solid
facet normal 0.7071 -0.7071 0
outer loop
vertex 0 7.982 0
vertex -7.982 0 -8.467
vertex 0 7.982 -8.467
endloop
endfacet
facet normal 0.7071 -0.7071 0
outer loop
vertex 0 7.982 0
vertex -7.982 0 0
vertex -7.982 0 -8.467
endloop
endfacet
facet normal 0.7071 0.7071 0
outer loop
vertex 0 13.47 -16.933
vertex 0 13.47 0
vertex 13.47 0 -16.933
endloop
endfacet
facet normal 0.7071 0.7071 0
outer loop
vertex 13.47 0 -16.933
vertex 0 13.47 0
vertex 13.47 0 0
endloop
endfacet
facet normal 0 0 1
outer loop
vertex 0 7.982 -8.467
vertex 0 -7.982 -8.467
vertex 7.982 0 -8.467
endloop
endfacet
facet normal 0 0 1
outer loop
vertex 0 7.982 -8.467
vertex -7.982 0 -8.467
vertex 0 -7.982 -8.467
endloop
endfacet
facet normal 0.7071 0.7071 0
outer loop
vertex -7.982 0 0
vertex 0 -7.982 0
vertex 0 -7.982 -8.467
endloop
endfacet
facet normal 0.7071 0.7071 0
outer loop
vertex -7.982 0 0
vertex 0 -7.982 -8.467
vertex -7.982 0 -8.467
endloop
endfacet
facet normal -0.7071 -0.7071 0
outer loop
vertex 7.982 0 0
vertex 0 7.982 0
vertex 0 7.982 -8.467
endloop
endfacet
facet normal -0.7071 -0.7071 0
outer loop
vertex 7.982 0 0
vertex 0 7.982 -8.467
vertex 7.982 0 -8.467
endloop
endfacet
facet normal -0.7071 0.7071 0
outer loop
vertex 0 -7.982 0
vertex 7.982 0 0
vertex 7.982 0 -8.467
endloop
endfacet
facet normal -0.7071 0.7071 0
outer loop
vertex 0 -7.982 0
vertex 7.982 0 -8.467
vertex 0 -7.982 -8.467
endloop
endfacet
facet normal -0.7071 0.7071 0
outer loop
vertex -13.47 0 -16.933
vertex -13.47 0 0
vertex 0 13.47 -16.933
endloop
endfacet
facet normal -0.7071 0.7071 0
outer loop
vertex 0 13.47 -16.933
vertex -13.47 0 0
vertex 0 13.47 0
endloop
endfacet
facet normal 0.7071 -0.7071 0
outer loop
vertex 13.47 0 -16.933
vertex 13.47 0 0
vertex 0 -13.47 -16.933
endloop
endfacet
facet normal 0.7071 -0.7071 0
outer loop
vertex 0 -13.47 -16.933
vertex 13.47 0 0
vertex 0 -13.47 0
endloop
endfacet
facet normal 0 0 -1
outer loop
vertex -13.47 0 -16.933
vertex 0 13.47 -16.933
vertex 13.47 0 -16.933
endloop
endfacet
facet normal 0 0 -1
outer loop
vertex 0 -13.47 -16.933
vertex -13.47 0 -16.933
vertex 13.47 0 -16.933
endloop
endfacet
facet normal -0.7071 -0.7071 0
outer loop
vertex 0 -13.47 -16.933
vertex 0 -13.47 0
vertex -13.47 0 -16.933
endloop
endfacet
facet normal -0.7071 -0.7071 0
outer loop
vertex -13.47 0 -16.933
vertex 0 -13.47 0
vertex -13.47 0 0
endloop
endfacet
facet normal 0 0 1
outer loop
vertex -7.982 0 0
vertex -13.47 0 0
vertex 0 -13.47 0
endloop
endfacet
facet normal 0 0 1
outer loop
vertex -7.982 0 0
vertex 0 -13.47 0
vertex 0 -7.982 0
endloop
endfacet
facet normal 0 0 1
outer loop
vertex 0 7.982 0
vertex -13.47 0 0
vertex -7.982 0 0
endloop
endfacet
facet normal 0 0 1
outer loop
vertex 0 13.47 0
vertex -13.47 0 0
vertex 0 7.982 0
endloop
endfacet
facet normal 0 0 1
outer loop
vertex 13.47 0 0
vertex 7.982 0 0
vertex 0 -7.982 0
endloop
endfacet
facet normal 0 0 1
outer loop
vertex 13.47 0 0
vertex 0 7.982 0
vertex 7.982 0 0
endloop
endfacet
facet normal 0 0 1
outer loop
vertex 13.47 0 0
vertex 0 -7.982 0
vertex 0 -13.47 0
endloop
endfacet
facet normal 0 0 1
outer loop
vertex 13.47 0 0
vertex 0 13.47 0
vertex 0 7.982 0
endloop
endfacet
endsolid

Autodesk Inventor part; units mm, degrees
ref_plane "YZ Plane" through (0, 0, 0) normal (1, 0, 0) x (0, 1, 0)
ref_plane "XZ Plane" through (0, 0, 0) normal (0, 1, 0) x (-1, 0, 0)
ref_plane "XY Plane" through (0, 0, 0) normal (0, 0, 1) x (1, 0, 0)
sketch "Sketch1" plane through (0, 0, 0) normal (0, 0, 1) x (1, 0, 0)
  line L0 (13.4704, 0) -> (0, -13.4704)
  line L1 (0, -13.4704) -> (-13.4704, 0)
  line L2 (-13.4704, 0) -> (0, 13.4704)
  line L3 (0, 13.4704) -> (13.4704, 0)
  line L4 (0, 0) -> (0, 13.4704) construction
  dimension "d0" = 19.05
extrude "Extrusion1" add sketch "Sketch1" against normal blind 16.9333
sketch "Sketch2" plane through (0, 0, -16.9333) normal (0, 0, -1) x (-1, 0, 0)
  circle A0 centre (0, 0) radius 4
  dimension "d3" = 8
sketch "Sketch3" plane through (0, 0, 0) normal (0, 0, 1) x (1, 0, 0)
  line L0 (0, 7.9824) -> (7.9824, 0)
  line L1 (7.9824, 0) -> (0, -7.9824)
  line L2 (0, -7.9824) -> (-7.9824, 0)
  line L3 (-7.9824, 0) -> (0, 7.9824)
  line L4 (-7.9824, 0) -> (0, 0) construction
  dimension "d4" = 11.2889
extrude "Extrusion2" cut sketch "Sketch3" against normal blind 8.4667
properties part number "Driver Shaft"
